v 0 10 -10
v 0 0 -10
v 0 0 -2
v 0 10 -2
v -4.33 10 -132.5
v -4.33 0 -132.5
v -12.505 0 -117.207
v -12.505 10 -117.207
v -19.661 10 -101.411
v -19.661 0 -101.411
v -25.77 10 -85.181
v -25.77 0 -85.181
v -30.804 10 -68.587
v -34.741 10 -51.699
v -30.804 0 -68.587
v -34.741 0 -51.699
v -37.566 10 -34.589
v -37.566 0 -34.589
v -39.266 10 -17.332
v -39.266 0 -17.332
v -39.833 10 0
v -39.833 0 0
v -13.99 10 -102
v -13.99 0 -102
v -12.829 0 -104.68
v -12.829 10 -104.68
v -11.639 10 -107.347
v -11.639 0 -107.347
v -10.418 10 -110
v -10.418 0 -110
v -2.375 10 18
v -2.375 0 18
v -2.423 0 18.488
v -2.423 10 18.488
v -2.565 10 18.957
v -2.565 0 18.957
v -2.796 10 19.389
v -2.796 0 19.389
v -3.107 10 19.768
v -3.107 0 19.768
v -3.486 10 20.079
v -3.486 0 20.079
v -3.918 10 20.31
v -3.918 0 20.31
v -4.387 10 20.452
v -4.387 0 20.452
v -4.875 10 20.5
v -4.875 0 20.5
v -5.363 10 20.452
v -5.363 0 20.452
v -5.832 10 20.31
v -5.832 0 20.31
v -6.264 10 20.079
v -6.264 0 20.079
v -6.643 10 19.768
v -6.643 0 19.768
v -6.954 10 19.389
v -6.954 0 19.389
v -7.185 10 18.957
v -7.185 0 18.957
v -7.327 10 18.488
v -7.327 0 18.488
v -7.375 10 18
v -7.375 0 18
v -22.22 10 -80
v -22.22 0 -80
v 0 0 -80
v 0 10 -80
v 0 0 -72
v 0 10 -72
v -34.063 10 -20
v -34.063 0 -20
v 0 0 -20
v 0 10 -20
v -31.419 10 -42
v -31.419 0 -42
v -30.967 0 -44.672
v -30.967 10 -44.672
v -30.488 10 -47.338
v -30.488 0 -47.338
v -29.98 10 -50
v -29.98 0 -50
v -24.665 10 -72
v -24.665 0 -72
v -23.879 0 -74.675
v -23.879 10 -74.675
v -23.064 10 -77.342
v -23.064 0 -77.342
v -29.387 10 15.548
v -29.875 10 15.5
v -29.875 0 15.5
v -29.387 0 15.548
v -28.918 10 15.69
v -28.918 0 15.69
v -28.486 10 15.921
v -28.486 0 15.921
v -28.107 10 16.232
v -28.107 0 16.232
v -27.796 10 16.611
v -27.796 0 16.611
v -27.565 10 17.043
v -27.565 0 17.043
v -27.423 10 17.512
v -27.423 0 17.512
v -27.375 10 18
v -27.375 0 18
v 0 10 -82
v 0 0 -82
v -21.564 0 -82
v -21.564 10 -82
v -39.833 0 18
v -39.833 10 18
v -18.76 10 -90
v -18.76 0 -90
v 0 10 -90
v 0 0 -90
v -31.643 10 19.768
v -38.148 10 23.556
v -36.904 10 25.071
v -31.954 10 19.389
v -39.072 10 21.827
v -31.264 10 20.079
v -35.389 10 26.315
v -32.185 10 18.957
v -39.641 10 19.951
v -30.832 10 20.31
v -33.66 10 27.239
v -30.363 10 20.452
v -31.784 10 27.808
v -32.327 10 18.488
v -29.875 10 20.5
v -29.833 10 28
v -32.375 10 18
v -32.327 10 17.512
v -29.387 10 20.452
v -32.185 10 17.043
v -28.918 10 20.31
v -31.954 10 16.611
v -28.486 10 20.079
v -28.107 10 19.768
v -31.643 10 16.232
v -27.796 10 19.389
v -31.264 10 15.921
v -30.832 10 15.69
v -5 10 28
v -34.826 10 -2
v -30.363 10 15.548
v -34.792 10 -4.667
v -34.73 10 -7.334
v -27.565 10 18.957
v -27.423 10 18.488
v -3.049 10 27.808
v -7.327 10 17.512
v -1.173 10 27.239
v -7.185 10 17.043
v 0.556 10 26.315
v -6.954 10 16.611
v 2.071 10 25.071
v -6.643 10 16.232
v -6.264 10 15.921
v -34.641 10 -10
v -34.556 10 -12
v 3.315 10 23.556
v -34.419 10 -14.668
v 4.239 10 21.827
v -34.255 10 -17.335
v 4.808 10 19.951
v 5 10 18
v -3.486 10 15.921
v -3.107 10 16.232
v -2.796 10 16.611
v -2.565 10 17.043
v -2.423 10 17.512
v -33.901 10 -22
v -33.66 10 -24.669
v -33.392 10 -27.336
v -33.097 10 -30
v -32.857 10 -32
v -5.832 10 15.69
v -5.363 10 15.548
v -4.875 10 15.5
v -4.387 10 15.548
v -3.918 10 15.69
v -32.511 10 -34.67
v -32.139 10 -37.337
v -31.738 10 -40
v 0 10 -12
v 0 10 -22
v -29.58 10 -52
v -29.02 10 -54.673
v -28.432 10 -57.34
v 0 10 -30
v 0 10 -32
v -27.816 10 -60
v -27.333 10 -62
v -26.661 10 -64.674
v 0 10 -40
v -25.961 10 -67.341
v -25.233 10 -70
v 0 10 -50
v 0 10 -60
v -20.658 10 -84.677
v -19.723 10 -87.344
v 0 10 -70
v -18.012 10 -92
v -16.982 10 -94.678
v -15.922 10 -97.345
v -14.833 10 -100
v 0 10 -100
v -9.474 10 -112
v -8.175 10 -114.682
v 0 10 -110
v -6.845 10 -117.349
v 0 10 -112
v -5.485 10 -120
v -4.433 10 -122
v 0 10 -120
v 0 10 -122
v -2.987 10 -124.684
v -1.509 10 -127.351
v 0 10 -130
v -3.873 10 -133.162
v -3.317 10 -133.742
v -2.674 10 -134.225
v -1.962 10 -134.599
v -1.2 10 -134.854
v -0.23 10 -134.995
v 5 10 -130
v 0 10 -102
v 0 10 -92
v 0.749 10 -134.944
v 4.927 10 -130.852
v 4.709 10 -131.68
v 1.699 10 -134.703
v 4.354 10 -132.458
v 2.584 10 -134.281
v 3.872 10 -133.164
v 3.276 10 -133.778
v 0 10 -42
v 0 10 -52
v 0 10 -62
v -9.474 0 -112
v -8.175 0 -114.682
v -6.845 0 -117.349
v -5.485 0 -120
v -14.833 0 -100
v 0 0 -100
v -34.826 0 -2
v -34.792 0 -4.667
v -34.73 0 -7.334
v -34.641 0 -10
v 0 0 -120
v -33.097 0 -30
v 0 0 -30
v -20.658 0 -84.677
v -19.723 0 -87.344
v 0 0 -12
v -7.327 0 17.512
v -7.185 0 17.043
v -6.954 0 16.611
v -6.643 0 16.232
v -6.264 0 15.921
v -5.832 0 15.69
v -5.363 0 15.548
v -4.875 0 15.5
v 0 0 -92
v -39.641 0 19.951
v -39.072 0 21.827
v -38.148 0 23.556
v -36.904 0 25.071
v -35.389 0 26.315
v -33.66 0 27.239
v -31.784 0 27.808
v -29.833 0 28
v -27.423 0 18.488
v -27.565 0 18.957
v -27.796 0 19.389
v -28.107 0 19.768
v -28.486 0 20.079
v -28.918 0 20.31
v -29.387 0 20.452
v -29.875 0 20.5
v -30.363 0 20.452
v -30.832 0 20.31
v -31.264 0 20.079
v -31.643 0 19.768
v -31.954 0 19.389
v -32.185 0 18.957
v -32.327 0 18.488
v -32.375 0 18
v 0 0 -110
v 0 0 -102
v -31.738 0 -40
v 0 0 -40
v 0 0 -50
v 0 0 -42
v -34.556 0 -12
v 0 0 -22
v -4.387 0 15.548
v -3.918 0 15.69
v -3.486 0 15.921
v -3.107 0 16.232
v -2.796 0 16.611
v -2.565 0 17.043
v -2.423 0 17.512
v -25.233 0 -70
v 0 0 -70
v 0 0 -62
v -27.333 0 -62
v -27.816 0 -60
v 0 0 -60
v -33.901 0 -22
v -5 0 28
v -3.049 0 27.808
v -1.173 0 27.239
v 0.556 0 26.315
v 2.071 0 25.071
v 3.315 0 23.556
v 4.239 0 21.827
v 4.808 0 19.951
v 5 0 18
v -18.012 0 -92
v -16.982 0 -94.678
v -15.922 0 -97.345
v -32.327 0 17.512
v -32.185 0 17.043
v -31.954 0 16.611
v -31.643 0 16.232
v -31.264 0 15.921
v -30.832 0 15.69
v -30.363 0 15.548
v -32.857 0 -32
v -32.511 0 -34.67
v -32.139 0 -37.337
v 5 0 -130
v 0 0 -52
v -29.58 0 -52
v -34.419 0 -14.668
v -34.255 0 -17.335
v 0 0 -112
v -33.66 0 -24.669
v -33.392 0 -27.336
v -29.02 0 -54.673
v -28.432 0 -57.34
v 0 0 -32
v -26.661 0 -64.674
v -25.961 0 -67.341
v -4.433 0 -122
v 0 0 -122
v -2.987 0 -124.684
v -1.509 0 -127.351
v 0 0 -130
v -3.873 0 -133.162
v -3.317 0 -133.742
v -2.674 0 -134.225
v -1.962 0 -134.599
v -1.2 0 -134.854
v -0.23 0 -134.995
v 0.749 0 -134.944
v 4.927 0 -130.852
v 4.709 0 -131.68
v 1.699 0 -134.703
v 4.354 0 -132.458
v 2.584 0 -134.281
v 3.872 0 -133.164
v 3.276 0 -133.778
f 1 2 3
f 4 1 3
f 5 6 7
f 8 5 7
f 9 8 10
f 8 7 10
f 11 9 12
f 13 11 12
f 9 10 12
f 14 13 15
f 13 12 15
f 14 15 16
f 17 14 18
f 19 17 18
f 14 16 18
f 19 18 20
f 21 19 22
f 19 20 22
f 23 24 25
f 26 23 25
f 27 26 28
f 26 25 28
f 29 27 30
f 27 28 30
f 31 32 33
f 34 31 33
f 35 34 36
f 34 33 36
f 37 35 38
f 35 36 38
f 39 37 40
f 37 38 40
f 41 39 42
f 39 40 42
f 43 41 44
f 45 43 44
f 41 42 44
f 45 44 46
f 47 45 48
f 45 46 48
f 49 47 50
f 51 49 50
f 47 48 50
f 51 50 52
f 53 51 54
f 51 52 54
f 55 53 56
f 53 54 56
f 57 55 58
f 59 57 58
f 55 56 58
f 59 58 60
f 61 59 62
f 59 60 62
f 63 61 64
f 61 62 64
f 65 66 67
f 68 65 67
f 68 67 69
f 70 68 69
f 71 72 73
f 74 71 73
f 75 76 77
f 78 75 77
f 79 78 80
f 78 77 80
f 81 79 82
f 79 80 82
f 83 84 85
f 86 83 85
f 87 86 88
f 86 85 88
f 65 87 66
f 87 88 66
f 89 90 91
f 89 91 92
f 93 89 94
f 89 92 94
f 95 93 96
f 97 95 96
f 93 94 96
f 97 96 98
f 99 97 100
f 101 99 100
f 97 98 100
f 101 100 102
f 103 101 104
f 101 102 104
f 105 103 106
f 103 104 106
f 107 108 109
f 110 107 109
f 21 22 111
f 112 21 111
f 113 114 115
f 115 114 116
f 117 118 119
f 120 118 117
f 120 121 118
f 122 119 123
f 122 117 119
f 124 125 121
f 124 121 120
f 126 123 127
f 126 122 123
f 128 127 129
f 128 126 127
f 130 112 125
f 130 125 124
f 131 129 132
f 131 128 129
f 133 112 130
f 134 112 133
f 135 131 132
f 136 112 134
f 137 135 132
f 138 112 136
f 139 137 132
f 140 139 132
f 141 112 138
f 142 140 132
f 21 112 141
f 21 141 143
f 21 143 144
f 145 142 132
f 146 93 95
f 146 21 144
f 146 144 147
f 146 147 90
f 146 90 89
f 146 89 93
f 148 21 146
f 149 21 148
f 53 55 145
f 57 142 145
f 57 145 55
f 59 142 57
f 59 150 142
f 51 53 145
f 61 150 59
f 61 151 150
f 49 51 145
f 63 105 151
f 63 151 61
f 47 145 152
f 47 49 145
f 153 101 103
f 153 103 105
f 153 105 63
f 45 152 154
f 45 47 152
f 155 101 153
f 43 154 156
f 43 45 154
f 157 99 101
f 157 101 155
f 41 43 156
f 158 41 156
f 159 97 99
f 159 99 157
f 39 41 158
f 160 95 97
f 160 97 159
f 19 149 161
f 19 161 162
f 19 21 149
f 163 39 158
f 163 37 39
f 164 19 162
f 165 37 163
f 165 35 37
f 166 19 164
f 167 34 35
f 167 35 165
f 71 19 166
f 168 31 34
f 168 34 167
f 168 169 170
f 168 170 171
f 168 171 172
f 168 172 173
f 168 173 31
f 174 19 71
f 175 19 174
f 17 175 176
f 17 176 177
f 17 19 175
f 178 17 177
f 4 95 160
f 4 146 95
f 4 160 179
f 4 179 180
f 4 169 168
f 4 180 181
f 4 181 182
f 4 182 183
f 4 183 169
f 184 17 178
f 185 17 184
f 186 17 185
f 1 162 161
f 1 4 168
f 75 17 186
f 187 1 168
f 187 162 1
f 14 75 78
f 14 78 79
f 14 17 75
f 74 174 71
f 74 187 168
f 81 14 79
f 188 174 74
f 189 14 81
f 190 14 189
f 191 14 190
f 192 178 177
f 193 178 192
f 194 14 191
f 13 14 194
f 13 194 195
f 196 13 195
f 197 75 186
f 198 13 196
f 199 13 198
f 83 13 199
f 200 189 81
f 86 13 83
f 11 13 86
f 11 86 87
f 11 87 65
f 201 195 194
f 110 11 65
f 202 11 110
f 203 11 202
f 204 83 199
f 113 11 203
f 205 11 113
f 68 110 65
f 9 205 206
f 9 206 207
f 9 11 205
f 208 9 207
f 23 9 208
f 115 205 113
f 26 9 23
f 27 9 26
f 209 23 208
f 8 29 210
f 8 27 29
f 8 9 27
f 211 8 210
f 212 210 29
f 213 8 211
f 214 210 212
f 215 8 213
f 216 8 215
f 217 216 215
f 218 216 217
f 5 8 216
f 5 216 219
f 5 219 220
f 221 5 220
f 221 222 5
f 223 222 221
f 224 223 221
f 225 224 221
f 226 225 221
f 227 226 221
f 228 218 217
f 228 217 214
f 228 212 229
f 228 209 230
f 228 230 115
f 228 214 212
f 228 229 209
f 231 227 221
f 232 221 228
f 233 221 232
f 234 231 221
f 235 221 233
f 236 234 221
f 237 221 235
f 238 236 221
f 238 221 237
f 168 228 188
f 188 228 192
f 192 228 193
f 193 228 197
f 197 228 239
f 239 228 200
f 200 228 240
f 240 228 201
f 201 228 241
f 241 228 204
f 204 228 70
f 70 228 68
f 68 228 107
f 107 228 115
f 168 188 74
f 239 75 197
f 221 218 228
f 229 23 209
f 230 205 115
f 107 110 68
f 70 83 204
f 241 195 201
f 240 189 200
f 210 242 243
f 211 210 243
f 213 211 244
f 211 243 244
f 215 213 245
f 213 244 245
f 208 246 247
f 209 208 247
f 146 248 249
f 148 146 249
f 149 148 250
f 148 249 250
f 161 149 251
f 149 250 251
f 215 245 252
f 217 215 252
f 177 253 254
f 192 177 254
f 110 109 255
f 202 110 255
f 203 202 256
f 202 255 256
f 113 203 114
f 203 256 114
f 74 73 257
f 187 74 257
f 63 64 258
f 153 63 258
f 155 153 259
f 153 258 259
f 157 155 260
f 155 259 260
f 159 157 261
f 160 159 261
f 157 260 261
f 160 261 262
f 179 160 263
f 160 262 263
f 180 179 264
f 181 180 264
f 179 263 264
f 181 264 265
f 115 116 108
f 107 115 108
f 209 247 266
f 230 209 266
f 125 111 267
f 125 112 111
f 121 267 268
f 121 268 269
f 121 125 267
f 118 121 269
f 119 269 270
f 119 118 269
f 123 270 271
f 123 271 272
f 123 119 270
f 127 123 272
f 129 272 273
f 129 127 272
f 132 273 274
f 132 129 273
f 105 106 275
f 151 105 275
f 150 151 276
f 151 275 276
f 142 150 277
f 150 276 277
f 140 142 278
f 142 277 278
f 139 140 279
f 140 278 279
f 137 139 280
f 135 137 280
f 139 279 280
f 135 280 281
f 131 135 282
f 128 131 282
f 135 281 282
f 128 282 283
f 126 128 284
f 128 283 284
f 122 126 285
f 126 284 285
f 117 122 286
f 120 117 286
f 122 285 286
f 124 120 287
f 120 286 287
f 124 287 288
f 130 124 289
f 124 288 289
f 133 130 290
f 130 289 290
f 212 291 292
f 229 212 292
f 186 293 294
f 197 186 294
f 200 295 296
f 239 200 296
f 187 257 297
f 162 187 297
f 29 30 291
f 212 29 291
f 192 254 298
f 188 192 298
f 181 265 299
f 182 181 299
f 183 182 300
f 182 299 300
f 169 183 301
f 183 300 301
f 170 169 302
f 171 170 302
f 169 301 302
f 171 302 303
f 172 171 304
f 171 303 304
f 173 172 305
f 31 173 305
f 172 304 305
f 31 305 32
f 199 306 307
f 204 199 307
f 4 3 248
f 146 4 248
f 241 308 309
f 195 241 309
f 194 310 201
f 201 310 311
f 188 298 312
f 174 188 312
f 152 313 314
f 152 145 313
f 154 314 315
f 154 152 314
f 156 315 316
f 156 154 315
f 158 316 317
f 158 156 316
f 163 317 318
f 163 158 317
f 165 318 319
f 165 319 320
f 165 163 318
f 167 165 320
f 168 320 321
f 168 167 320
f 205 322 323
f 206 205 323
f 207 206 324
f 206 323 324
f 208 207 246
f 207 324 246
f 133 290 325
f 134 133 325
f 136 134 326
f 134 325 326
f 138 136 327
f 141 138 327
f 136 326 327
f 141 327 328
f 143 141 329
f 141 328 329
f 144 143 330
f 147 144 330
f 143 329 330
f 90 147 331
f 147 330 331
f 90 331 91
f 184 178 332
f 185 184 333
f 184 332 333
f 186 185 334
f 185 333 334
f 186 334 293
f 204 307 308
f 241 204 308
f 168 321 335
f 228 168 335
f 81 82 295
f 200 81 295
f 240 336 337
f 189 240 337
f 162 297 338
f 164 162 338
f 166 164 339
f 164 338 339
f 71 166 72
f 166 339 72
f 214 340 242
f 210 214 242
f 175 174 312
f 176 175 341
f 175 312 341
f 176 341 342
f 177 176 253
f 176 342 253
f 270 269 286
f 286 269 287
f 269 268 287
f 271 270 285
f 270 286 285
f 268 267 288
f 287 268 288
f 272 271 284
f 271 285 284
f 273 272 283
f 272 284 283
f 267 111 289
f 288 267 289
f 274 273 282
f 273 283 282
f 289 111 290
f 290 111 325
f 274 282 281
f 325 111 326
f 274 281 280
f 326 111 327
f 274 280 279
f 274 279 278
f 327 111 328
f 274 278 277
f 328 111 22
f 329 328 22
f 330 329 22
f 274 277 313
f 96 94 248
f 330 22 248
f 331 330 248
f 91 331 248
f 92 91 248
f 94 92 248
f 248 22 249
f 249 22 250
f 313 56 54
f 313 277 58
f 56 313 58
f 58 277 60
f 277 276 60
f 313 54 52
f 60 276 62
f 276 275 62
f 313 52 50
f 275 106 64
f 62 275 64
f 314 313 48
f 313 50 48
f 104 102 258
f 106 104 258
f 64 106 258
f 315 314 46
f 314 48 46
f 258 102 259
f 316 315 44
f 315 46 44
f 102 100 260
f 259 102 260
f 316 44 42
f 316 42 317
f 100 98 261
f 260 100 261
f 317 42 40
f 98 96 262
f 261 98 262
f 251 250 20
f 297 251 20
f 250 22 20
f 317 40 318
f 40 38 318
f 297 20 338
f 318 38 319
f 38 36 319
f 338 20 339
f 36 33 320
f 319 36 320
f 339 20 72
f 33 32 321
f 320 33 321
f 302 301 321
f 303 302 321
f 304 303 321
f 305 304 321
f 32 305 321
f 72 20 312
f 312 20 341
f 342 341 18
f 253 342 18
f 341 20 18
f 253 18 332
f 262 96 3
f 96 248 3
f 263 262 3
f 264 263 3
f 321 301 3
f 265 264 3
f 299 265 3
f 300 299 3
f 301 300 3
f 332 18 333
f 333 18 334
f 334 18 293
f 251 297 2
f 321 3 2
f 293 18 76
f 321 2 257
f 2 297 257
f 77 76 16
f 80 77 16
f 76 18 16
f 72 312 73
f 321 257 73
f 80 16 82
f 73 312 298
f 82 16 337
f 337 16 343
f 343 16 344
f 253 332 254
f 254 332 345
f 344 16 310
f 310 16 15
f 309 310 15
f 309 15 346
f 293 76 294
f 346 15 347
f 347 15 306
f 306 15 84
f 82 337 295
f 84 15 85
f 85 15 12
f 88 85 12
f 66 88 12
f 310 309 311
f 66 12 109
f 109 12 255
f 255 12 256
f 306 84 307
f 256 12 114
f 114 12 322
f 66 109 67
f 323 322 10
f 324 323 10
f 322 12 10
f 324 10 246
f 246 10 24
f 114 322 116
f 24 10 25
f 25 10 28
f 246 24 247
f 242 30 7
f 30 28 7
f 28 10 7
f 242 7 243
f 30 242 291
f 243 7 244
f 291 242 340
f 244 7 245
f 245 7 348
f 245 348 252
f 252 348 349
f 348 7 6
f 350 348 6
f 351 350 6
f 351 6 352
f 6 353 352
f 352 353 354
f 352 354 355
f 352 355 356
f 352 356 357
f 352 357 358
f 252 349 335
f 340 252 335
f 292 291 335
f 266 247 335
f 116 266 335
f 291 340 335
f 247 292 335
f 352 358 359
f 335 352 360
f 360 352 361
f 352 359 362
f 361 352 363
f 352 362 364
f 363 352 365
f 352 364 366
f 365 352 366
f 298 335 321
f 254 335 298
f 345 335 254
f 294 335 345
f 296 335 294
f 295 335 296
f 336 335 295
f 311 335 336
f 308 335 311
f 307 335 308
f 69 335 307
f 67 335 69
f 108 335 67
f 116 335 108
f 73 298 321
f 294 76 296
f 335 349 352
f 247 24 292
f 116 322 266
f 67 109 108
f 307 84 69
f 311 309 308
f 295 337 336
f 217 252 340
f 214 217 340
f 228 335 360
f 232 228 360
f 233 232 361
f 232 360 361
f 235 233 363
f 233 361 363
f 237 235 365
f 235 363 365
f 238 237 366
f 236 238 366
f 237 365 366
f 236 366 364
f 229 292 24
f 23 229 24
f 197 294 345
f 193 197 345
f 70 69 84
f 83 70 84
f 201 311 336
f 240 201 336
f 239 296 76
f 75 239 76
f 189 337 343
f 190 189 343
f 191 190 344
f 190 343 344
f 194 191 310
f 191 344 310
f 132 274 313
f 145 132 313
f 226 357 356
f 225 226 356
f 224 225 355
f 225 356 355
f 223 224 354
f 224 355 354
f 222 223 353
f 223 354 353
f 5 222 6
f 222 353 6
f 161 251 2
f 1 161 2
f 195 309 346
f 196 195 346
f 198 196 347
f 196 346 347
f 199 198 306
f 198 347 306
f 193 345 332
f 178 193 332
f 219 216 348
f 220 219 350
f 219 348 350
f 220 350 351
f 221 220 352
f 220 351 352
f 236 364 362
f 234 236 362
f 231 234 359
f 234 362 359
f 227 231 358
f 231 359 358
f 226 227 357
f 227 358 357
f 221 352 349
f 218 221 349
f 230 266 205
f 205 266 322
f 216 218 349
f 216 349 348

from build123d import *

# Parameters (mm, degrees)
SKETCH1_W           = 34.833395016
SKETCH1_H           = 8
SKETCH1_W_2         = 5
SKETCH1_H_2         = 10
BOSS_EXTRUDE1_DEPTH = 10
FILLET1_R           = 10


with BuildPart() as part:
    # Sketch1 → Boss-Extrude1 (new body)
    with BuildSketch(Plane(origin=(0, 0, 0), x_dir=(1, 0, 0), z_dir=(0, 1, 0))):
        with BuildLine():
            Line((-34.833395016, 0), (0, 0))
            Line((0, 0), (0, 2))
            Line((0, 2), (-34.825702595, 2))
            ThreePointArc((-34.825702595, 2), (-34.831471904, 1.000007397), (-34.833395016, 0))
        make_face()
        Polygon((0, 2), (0, 0), (5, 0), (5, 130), (0, 130), (0, 122), (0, 120), (0, 112), (0, 110), (0, 102), (0, 100), (0, 92), (0, 90), (0, 82), (0, 80), (0, 72), (0, 70), (0, 62), (0, 60), (0, 52), (0, 50), (0, 42), (0, 40), (0, 32), (0, 30), (0, 22), (0, 20), (0, 12), (0, 10), align=None)
        with BuildLine():
            Line((-34.641016151, 10), (0, 10))
            Line((0, 10), (0, 12))
            Line((0, 12), (-34.556324308, 12))
            ThreePointArc((-34.556324308, 12), (-34.600595037, 11.000081508), (-34.641016151, 10))
        make_face()
        with BuildLine():
            Line((-39.833395016, 0), (-34.833395016, 0))
            ThreePointArc((-34.833395016, 0), (-34.831471904, 1.000007397), (-34.825702595, 2))
            ThreePointArc((-34.825702595, 2), (-34.764138624, 6.000710564), (-34.641016151, 10))
            ThreePointArc((-34.641016151, 10), (-34.600595037, 11.000081508), (-34.556324308, 12))
            ThreePointArc((-34.556324308, 12), (-34.340503133, 16.001901029), (-34.063022952, 20))
            ThreePointArc((-34.063022952, 20), (-33.98391775, 21.000156347), (-33.900953772, 22))
            ThreePointArc((-33.900953772, 22), (-33.529816222, 26.003108568), (-33.096826419, 30))
            ThreePointArc((-33.096826419, 30), (-32.978675002, 31.000232599), (-32.856649782, 32))
            ThreePointArc((-32.856649782, 32), (-32.328418622, 36.004344436), (-31.738046589, 40))
            ThreePointArc((-31.738046589, 40), (-31.580302492, 41.000310991), (-31.418663494, 42))
            ThreePointArc((-31.418663494, 42), (-30.730801915, 46.005620768), (-29.98041146, 50))
            ThreePointArc((-29.98041146, 50), (-29.782331047, 51.000392318), (-29.580328265, 52))
            ThreePointArc((-29.580328265, 52), (-28.729478957, 56.006950993), (-27.81560783, 60))
            ThreePointArc((-27.81560783, 60), (-27.576232201, 61.000477471), (-27.332899966, 62))
            ThreePointArc((-27.332899966, 62), (-26.314801256, 66.008350348), (-25.233075527, 70))
            ThreePointArc((-25.233075527, 70), (-24.951206094, 71.000567472), (-24.66533853, 72))
            ThreePointArc((-24.66533853, 72), (-23.474712485, 76.009836516), (-22.219732553, 80))
            ThreePointArc((-22.219732553, 80), (-21.893898758, 81.00066352), (-21.564017355, 82))
            ThreePointArc((-21.564017355, 82), (-20.194422544, 86.011430464), (-18.759613369, 90))
            ThreePointArc((-18.759613369, 90), (-18.388030357, 91.000767051), (-18.012341473, 92))
            ThreePointArc((-18.012341473, 92), (-16.455980001, 96.013157563), (-14.833395016, 100))
            ThreePointArc((-14.833395016, 100), (-14.413908154, 101.00087982), (-13.990247312, 102))
            ThreePointArc((-13.990247312, 102), (-12.237711236, 106.01504912), (-10.417774804, 110))
            ThreePointArc((-10.417774804, 110), (-9.947786552, 111.001004016), (-9.473545033, 112))
            ThreePointArc((-9.473545033, 112), (-7.513480483, 116.017144539), (-5.484646909, 120))
            ThreePointArc((-5.484646909, 120), (-4.961019464, 121.001142415), (-4.433046584, 122))
            ThreePointArc((-4.433046584, 122), (-2.25170348, 126.019494426), (0, 130))
            Line((0, 130), (-1.200062972, 134.853848871))
            ThreePointArc((-1.200062972, 134.853848871), (-3.00514583, 133.996135451), (-4.330127019, 132.5))
            ThreePointArc((-4.330127019, 132.5), (-30.803738983, 68.587046952), (-39.833395016, 0))
        make_face()
        with BuildLine():
            Line((-34.063022952, 20), (0, 20))
            Line((0, 20), (0, 22))
            Line((0, 22), (-33.900953772, 22))
            ThreePointArc((-33.900953772, 22), (-33.98391775, 21.000156347), (-34.063022952, 20))
        make_face()
        with BuildLine():
            Line((-33.096826419, 30), (0, 30))
            Line((0, 30), (0, 32))
            Line((0, 32), (-32.856649782, 32))
            ThreePointArc((-32.856649782, 32), (-32.978675002, 31.000232599), (-33.096826419, 30))
        make_face()
        with BuildLine():
            Line((-31.738046589, 40), (0, 40))
            Line((0, 40), (0, 42))
            Line((0, 42), (-31.418663494, 42))
            ThreePointArc((-31.418663494, 42), (-31.580302492, 41.000310991), (-31.738046589, 40))
        make_face()
        with BuildLine():
            Line((-29.98041146, 50), (0, 50))
            Line((0, 50), (0, 52))
            Line((0, 52), (-29.580328265, 52))
            ThreePointArc((-29.580328265, 52), (-29.782331047, 51.000392318), (-29.98041146, 50))
        make_face()
        with BuildLine():
            Line((-1.200062972, 134.853848871), (0, 130))
            Line((0, 130), (2.583616786, 134.280762117))
            ThreePointArc((2.583616786, 134.280762117), (0.748773929, 134.943615843), (-1.200062972, 134.853848871))
        make_face()
        with BuildLine():
            Line((0, 130), (5, 130))
            ThreePointArc((5, 130), (4.3541982, 132.457836047), (2.583616786, 134.280762117))
            Line((2.583616786, 134.280762117), (0, 130))
        make_face()
        with BuildLine():
            Line((0, 120), (0, 122))
            Line((0, 122), (-4.433046584, 122))
            ThreePointArc((-4.433046584, 122), (-4.961019464, 121.001142415), (-5.484646909, 120))
            Line((-5.484646909, 120), (0, 120))
        make_face()
        with BuildLine():
            Line((0, 110), (0, 112))
            Line((0, 112), (-9.473545033, 112))
            ThreePointArc((-9.473545033, 112), (-9.947786552, 111.001004016), (-10.417774804, 110))
            Line((-10.417774804, 110), (0, 110))
        make_face()
        with BuildLine():
            Line((0, 100), (0, 102))
            Line((0, 102), (-13.990247312, 102))
            ThreePointArc((-13.990247312, 102), (-14.413908154, 101.00087982), (-14.833395016, 100))
            Line((-14.833395016, 100), (0, 100))
        make_face()
        with BuildLine():
            Line((0, 90), (0, 92))
            Line((0, 92), (-18.012341473, 92))
            ThreePointArc((-18.012341473, 92), (-18.388030357, 91.000767051), (-18.759613369, 90))
            Line((-18.759613369, 90), (0, 90))
        make_face()
        with BuildLine():
            Line((0, 80), (0, 82))
            Line((0, 82), (-21.564017355, 82))
            ThreePointArc((-21.564017355, 82), (-21.893898758, 81.00066352), (-22.219732553, 80))
            Line((-22.219732553, 80), (0, 80))
        make_face()
        with BuildLine():
            Line((-25.233075527, 70), (0, 70))
            Line((0, 70), (0, 72))
            Line((0, 72), (-24.66533853, 72))
            ThreePointArc((-24.66533853, 72), (-24.951206094, 71.000567472), (-25.233075527, 70))
        make_face()
        with BuildLine():
            Line((-27.81560783, 60), (0, 60))
            Line((0, 60), (0, 62))
            Line((0, 62), (-27.332899966, 62))
            ThreePointArc((-27.332899966, 62), (-27.576232201, 61.000477471), (-27.81560783, 60))
        make_face()
        with Locations((-17.416697508, -4)):
            Rectangle(SKETCH1_W, SKETCH1_H)
        Polygon((-34.833395016, -8), (-34.833395016, 0), (-39.833395016, 0), (-39.833395016, -18), (-34.833395016, -18), align=None)
        with Locations((-37.333395016, -23)):
            Rectangle(SKETCH1_W_2, SKETCH1_H_2)
        with BuildLine():
            Line((0, -28), (0, -18))
            Line((0, -18), (-2.375046262, -18))
            ThreePointArc((-2.375046262, -18), (-4.875046262, -20.5), (-7.375046262, -18))
            Line((-7.375046262, -18), (-19.916697508, -18))
            Line((-19.916697508, -18), (-27.375046262, -18))
            ThreePointArc((-27.375046262, -18), (-29.875046262, -20.5), (-32.375046262, -18))
            Line((-32.375046262, -18), (-34.833395016, -18))
            Line((-34.833395016, -18), (-34.833395016, -28))
            Line((-34.833395016, -28), (0, -28))
        make_face()
        with BuildLine():
            Line((0, -18), (0, -8))
            Line((0, -8), (-34.833395016, -8))
            Line((-34.833395016, -8), (-34.833395016, -18))
            Line((-34.833395016, -18), (-32.375046262, -18))
            ThreePointArc((-32.375046262, -18), (-31.642813215, -16.232233047), (-29.875046262, -15.5))
            Line((-29.875046262, -15.5), (-4.875046262, -15.5))
            ThreePointArc((-4.875046262, -15.5), (-3.107279309, -16.232233047), (-2.375046262, -18))
            Line((-2.375046262, -18), (0, -18))
        make_face()
        with BuildLine():
            Line((-19.916697508, -18), (-7.375046262, -18))
            ThreePointArc((-7.375046262, -18), (-6.642813215, -16.232233047), (-4.875046262, -15.5))
            Line((-4.875046262, -15.5), (-29.875046262, -15.5))
            ThreePointArc((-29.875046262, -15.5), (-28.107279309, -16.232233047), (-27.375046262, -18))
            Line((-27.375046262, -18), (-19.916697508, -18))
        make_face()
        Polygon((5, 0), (0, 0), (0, -8), (0, -18), (0, -28), (5, -28), align=None)
    extrude(amount=BOSS_EXTRUDE1_DEPTH)

    # Fillet1
    fillet1_edges = [part.edges().sort_by_distance(p)[0] for p in [
        (5, 5, 28),
        (-39.833395016, 5, 28),
    ]]
    fillet(fillet1_edges, radius=FILLET1_R)


solid = part.part
